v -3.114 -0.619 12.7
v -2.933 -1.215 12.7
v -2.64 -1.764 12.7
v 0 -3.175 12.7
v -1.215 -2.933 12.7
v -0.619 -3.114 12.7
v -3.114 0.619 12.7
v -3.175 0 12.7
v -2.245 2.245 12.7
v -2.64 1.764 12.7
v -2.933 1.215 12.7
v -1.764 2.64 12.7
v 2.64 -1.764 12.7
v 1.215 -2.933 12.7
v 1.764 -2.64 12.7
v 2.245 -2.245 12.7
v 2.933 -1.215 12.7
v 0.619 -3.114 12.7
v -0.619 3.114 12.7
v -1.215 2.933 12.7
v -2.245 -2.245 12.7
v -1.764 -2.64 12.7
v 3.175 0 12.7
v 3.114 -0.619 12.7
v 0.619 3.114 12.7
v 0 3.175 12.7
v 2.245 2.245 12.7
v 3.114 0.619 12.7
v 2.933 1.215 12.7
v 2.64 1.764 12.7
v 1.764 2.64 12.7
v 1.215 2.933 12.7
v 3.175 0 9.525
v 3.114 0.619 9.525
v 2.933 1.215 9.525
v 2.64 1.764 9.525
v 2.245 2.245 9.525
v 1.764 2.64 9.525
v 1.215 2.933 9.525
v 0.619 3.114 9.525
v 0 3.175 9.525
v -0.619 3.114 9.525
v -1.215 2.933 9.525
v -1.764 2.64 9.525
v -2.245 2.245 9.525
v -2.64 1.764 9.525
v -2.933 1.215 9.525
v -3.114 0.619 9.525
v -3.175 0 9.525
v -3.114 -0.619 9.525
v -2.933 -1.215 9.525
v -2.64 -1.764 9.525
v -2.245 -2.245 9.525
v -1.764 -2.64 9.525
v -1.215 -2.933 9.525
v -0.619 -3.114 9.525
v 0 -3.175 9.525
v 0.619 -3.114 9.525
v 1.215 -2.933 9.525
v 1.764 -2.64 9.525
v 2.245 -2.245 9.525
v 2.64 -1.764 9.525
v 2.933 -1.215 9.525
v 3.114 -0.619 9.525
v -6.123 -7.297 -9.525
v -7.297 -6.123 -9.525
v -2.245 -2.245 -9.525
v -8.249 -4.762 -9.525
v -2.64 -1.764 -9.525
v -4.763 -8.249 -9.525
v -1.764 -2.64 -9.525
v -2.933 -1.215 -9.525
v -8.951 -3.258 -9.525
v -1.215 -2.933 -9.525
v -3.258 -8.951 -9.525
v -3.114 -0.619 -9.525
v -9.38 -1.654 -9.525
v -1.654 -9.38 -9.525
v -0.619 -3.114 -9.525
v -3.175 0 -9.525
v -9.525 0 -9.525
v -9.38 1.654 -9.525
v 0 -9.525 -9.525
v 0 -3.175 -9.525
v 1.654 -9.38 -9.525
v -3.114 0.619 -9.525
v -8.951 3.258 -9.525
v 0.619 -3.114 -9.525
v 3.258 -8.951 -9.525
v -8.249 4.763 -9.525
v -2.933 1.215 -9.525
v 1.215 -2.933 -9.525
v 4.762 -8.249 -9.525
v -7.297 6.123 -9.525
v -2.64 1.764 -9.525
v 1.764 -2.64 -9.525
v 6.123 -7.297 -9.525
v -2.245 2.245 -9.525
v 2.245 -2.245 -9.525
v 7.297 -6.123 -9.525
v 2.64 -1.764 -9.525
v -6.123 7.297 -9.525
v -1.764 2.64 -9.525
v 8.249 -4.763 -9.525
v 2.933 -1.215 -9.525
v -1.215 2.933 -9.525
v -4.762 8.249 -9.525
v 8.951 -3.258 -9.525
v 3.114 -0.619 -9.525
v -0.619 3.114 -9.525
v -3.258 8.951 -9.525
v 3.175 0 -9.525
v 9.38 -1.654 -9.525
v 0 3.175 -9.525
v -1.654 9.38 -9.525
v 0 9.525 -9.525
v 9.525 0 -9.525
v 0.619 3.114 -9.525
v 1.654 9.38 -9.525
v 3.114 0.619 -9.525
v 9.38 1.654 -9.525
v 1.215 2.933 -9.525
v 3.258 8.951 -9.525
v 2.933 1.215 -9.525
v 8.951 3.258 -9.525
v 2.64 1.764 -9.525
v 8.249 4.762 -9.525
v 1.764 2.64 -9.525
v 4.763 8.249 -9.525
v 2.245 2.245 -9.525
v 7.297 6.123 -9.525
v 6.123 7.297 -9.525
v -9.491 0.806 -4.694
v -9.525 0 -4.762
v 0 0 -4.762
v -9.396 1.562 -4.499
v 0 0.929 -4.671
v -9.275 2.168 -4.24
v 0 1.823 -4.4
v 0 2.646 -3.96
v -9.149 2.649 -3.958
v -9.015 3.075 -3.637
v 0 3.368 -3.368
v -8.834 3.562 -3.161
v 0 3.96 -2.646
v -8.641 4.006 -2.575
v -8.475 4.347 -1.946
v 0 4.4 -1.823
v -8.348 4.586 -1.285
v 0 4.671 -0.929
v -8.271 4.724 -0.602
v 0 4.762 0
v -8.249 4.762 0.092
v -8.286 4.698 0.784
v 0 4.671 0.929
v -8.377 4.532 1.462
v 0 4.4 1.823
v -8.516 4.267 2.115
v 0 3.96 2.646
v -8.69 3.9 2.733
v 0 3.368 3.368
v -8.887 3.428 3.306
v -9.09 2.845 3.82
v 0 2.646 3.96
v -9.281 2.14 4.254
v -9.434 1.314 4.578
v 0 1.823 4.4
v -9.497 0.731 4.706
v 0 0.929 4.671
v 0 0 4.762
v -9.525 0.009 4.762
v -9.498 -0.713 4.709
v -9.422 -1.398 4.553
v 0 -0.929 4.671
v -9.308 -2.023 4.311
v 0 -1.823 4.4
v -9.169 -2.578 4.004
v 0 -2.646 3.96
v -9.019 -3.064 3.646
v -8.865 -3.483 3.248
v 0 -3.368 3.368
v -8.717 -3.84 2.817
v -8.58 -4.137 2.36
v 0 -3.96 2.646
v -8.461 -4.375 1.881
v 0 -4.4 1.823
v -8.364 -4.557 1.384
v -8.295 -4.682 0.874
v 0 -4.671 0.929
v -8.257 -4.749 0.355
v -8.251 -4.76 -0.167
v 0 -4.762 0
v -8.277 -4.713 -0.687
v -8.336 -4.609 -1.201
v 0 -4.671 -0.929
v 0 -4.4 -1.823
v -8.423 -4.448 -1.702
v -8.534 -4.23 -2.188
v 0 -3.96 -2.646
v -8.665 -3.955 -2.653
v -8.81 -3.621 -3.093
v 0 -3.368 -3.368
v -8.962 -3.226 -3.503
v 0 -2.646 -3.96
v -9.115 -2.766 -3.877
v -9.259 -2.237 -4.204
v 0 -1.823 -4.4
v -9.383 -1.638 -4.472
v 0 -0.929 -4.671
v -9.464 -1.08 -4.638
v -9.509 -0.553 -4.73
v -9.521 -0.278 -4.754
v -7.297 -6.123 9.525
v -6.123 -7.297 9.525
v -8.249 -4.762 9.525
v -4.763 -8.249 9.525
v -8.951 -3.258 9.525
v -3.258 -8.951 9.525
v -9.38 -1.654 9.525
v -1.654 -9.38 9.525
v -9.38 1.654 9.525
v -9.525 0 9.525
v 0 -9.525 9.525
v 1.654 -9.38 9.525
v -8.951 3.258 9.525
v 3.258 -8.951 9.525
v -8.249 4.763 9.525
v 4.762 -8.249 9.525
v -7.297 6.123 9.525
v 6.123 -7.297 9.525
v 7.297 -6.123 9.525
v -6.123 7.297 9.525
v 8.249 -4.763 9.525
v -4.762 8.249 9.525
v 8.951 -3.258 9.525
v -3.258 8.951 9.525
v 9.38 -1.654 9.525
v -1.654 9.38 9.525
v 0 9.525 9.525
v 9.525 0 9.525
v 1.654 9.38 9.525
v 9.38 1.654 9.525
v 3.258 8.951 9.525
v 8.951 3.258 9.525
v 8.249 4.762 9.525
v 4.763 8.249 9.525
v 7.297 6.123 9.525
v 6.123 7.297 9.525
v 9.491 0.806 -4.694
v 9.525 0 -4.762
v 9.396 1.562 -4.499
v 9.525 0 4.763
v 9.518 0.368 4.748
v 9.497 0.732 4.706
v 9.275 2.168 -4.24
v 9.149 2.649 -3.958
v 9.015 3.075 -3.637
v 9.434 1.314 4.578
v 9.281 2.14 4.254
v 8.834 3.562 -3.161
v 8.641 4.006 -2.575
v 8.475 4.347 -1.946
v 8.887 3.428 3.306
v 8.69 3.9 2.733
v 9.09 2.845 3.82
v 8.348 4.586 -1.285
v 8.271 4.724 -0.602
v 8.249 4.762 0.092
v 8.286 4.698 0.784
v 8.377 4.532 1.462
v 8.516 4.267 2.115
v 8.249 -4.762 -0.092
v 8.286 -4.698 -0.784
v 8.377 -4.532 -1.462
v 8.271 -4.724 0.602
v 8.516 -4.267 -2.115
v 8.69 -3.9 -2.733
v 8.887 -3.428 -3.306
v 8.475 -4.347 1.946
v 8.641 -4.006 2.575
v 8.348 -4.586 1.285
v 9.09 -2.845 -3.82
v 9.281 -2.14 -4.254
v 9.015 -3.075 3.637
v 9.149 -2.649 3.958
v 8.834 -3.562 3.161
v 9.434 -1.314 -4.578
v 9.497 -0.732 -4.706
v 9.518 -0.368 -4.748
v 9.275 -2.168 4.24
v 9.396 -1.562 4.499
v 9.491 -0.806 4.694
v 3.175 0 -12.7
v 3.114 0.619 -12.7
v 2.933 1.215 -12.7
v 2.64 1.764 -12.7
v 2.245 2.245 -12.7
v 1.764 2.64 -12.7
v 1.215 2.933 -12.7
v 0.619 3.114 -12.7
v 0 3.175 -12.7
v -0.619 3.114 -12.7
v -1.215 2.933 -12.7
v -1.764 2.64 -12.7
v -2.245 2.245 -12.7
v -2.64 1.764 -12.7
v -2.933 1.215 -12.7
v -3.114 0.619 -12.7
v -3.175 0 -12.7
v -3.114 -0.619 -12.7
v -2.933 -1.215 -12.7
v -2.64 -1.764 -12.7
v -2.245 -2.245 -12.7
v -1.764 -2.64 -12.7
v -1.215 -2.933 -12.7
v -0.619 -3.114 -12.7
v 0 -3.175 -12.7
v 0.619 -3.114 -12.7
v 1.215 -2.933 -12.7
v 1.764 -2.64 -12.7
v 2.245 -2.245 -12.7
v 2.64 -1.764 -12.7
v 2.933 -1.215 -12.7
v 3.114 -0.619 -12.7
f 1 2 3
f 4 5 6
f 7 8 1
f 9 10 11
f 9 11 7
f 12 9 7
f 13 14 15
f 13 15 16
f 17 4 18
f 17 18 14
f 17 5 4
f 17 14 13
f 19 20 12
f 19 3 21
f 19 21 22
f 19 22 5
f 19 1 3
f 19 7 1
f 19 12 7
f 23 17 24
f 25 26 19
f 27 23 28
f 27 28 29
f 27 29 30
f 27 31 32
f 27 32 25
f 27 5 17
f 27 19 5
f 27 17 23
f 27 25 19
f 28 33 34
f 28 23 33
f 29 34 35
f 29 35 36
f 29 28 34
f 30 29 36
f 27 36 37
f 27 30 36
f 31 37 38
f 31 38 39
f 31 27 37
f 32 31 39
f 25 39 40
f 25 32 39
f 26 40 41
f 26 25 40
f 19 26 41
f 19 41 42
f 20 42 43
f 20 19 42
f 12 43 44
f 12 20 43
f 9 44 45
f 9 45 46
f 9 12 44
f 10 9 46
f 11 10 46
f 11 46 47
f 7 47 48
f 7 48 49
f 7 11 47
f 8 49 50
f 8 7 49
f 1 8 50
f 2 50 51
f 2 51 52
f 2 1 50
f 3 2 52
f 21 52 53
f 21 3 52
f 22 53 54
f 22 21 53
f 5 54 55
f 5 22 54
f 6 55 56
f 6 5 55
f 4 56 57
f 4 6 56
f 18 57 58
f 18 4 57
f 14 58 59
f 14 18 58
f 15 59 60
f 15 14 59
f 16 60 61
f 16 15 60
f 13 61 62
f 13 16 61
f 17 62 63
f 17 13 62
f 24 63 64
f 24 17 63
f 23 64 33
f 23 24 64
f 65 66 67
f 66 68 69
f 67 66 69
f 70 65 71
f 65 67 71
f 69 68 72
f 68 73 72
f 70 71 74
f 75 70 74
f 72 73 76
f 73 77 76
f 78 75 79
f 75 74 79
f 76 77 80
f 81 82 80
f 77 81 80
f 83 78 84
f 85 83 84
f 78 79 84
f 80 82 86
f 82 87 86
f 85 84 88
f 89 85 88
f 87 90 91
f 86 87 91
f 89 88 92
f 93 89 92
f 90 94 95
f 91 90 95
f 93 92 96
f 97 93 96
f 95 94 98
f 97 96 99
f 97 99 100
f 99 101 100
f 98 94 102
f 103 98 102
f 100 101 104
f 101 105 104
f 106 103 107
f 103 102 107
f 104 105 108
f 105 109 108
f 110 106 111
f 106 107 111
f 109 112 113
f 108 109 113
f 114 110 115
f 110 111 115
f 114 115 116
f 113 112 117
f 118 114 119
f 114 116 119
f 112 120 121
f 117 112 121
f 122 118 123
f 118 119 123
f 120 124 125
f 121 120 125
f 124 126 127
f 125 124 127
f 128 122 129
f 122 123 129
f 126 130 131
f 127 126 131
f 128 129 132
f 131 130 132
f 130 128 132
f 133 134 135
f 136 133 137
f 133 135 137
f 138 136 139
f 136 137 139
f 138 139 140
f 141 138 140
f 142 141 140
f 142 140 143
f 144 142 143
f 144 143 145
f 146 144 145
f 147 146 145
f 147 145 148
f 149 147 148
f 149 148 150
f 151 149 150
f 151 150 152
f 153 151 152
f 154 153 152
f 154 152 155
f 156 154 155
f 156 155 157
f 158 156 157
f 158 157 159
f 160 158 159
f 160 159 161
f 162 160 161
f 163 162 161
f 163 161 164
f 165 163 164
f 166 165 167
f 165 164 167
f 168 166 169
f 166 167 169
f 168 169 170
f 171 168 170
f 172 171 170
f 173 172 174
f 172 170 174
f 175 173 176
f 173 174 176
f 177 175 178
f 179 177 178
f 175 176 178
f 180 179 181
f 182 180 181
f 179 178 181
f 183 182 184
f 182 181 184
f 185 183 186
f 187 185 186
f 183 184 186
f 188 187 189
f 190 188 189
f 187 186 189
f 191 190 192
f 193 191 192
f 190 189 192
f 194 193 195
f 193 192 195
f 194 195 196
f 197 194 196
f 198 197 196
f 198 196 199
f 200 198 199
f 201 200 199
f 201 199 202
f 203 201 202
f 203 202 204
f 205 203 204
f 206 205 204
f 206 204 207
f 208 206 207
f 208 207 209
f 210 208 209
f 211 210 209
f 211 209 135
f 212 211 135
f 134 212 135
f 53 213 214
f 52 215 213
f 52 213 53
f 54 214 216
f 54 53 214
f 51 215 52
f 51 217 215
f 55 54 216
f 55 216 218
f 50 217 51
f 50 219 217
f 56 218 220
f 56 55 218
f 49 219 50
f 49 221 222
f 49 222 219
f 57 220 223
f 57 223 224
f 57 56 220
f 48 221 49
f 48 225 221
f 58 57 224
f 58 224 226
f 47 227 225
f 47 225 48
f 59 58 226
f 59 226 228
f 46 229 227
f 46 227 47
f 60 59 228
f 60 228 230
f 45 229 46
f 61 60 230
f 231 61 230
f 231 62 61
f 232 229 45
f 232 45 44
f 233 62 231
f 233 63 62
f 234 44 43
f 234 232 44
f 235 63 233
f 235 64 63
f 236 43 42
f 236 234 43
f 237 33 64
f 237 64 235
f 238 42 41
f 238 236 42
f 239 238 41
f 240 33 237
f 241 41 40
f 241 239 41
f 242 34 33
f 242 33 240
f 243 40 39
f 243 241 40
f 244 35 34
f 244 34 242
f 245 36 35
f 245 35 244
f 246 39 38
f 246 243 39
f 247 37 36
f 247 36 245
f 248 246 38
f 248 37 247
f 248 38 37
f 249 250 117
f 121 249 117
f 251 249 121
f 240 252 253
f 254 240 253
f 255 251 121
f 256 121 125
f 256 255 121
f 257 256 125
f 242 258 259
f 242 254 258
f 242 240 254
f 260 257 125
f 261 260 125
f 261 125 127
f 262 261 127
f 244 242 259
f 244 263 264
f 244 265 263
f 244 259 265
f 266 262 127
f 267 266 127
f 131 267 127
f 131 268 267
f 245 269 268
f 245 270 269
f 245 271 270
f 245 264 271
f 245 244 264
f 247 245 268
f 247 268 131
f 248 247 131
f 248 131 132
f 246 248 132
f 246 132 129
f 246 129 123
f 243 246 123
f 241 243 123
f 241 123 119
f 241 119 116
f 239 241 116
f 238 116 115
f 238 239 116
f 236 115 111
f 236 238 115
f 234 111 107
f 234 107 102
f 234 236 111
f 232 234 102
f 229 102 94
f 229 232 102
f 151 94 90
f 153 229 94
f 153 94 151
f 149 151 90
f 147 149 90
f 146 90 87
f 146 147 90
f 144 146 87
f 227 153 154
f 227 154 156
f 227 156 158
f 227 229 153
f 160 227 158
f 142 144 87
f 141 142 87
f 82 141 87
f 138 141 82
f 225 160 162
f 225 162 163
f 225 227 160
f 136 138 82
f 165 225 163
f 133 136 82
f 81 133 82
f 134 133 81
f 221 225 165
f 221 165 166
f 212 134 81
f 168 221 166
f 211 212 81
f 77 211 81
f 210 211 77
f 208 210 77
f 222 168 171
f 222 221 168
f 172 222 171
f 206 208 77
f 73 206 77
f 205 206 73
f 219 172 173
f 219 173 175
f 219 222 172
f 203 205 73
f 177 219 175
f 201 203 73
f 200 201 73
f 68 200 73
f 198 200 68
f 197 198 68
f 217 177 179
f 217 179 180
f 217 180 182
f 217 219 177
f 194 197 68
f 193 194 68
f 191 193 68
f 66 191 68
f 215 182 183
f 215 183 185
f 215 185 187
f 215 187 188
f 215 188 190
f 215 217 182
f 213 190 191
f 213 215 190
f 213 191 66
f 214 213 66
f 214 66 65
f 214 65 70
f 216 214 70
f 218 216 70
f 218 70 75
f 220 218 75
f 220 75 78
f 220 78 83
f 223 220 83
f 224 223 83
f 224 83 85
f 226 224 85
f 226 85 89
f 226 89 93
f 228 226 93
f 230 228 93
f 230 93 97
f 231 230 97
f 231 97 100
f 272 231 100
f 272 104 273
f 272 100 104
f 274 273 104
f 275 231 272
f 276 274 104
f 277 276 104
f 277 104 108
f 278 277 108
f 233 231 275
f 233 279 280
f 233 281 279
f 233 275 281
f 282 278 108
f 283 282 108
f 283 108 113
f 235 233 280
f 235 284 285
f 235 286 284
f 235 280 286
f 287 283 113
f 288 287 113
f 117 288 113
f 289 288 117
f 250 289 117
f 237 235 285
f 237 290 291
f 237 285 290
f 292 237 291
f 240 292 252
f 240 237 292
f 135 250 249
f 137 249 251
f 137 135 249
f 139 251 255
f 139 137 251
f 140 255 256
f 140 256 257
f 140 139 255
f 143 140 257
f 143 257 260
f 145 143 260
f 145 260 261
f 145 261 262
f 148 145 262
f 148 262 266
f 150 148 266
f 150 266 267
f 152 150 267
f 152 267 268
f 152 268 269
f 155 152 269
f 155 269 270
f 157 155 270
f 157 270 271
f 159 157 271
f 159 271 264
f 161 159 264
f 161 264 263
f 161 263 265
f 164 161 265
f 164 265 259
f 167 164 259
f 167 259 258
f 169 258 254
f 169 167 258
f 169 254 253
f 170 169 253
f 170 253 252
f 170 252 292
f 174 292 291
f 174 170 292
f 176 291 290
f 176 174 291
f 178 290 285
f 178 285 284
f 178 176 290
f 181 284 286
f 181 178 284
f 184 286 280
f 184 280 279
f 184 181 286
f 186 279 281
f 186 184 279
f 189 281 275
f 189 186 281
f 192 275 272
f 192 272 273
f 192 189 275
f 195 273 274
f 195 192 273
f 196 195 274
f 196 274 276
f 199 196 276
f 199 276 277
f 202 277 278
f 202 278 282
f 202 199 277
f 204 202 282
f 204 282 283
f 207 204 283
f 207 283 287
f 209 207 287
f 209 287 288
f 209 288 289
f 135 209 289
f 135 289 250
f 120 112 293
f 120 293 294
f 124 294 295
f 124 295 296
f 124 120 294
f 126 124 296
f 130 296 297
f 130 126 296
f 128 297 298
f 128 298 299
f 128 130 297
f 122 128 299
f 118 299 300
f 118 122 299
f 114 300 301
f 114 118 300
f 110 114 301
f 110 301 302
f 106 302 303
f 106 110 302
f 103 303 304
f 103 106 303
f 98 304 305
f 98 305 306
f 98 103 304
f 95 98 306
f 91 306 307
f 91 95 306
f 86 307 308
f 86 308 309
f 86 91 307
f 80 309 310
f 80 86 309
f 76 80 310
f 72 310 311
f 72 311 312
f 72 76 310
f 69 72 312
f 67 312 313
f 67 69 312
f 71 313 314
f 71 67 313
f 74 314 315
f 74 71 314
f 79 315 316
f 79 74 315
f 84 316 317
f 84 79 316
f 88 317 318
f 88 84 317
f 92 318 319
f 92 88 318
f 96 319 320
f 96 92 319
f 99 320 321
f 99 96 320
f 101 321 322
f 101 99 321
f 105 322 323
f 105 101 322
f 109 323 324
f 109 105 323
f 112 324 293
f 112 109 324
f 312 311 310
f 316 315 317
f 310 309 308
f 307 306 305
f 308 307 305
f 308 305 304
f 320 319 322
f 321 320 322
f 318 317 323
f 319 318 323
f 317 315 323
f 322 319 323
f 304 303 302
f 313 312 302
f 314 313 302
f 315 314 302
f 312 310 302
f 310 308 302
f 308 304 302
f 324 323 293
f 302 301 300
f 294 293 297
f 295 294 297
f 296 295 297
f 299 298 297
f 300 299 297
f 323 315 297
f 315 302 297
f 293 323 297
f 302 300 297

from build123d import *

# Parameters (mm, degrees)
SKETCH1_R               = 9.525
BOSS_EXTRUDE1_DEPTH     = 9.525
SKETCH2_R               = 3.175
BOSS_EXTRUDE2_DEPTH     = 12.7
SKETCH3_R               = 4.7625
CUT_EXTRUDE1_DEPTH      = 10.525
CUT_EXTRUDE1_DEPTH_BACK = 10.525


with BuildPart() as part:
    # Sketch1 → Boss-Extrude1 (new body, symmetric)
    with BuildSketch(Plane.XY):
        Circle(SKETCH1_R)
    extrude(amount=BOSS_EXTRUDE1_DEPTH, both=True)

    # Sketch2 → Boss-Extrude2 (add, symmetric)
    with BuildSketch(Plane.XY):
        Circle(SKETCH2_R)
    extrude(amount=BOSS_EXTRUDE2_DEPTH, both=True)

    # Sketch3 → Cut-Extrude1 (cut, two sides)
    with BuildSketch(Plane(origin=(0, 0, 0), x_dir=(0, 0, -1), z_dir=(1, 0, 0))) as cut_extrude1_sk:
        Circle(SKETCH3_R)
    extrude(amount=CUT_EXTRUDE1_DEPTH, mode=Mode.SUBTRACT)
    extrude(cut_extrude1_sk.sketch, amount=-CUT_EXTRUDE1_DEPTH_BACK, mode=Mode.SUBTRACT)


solid = part.part
